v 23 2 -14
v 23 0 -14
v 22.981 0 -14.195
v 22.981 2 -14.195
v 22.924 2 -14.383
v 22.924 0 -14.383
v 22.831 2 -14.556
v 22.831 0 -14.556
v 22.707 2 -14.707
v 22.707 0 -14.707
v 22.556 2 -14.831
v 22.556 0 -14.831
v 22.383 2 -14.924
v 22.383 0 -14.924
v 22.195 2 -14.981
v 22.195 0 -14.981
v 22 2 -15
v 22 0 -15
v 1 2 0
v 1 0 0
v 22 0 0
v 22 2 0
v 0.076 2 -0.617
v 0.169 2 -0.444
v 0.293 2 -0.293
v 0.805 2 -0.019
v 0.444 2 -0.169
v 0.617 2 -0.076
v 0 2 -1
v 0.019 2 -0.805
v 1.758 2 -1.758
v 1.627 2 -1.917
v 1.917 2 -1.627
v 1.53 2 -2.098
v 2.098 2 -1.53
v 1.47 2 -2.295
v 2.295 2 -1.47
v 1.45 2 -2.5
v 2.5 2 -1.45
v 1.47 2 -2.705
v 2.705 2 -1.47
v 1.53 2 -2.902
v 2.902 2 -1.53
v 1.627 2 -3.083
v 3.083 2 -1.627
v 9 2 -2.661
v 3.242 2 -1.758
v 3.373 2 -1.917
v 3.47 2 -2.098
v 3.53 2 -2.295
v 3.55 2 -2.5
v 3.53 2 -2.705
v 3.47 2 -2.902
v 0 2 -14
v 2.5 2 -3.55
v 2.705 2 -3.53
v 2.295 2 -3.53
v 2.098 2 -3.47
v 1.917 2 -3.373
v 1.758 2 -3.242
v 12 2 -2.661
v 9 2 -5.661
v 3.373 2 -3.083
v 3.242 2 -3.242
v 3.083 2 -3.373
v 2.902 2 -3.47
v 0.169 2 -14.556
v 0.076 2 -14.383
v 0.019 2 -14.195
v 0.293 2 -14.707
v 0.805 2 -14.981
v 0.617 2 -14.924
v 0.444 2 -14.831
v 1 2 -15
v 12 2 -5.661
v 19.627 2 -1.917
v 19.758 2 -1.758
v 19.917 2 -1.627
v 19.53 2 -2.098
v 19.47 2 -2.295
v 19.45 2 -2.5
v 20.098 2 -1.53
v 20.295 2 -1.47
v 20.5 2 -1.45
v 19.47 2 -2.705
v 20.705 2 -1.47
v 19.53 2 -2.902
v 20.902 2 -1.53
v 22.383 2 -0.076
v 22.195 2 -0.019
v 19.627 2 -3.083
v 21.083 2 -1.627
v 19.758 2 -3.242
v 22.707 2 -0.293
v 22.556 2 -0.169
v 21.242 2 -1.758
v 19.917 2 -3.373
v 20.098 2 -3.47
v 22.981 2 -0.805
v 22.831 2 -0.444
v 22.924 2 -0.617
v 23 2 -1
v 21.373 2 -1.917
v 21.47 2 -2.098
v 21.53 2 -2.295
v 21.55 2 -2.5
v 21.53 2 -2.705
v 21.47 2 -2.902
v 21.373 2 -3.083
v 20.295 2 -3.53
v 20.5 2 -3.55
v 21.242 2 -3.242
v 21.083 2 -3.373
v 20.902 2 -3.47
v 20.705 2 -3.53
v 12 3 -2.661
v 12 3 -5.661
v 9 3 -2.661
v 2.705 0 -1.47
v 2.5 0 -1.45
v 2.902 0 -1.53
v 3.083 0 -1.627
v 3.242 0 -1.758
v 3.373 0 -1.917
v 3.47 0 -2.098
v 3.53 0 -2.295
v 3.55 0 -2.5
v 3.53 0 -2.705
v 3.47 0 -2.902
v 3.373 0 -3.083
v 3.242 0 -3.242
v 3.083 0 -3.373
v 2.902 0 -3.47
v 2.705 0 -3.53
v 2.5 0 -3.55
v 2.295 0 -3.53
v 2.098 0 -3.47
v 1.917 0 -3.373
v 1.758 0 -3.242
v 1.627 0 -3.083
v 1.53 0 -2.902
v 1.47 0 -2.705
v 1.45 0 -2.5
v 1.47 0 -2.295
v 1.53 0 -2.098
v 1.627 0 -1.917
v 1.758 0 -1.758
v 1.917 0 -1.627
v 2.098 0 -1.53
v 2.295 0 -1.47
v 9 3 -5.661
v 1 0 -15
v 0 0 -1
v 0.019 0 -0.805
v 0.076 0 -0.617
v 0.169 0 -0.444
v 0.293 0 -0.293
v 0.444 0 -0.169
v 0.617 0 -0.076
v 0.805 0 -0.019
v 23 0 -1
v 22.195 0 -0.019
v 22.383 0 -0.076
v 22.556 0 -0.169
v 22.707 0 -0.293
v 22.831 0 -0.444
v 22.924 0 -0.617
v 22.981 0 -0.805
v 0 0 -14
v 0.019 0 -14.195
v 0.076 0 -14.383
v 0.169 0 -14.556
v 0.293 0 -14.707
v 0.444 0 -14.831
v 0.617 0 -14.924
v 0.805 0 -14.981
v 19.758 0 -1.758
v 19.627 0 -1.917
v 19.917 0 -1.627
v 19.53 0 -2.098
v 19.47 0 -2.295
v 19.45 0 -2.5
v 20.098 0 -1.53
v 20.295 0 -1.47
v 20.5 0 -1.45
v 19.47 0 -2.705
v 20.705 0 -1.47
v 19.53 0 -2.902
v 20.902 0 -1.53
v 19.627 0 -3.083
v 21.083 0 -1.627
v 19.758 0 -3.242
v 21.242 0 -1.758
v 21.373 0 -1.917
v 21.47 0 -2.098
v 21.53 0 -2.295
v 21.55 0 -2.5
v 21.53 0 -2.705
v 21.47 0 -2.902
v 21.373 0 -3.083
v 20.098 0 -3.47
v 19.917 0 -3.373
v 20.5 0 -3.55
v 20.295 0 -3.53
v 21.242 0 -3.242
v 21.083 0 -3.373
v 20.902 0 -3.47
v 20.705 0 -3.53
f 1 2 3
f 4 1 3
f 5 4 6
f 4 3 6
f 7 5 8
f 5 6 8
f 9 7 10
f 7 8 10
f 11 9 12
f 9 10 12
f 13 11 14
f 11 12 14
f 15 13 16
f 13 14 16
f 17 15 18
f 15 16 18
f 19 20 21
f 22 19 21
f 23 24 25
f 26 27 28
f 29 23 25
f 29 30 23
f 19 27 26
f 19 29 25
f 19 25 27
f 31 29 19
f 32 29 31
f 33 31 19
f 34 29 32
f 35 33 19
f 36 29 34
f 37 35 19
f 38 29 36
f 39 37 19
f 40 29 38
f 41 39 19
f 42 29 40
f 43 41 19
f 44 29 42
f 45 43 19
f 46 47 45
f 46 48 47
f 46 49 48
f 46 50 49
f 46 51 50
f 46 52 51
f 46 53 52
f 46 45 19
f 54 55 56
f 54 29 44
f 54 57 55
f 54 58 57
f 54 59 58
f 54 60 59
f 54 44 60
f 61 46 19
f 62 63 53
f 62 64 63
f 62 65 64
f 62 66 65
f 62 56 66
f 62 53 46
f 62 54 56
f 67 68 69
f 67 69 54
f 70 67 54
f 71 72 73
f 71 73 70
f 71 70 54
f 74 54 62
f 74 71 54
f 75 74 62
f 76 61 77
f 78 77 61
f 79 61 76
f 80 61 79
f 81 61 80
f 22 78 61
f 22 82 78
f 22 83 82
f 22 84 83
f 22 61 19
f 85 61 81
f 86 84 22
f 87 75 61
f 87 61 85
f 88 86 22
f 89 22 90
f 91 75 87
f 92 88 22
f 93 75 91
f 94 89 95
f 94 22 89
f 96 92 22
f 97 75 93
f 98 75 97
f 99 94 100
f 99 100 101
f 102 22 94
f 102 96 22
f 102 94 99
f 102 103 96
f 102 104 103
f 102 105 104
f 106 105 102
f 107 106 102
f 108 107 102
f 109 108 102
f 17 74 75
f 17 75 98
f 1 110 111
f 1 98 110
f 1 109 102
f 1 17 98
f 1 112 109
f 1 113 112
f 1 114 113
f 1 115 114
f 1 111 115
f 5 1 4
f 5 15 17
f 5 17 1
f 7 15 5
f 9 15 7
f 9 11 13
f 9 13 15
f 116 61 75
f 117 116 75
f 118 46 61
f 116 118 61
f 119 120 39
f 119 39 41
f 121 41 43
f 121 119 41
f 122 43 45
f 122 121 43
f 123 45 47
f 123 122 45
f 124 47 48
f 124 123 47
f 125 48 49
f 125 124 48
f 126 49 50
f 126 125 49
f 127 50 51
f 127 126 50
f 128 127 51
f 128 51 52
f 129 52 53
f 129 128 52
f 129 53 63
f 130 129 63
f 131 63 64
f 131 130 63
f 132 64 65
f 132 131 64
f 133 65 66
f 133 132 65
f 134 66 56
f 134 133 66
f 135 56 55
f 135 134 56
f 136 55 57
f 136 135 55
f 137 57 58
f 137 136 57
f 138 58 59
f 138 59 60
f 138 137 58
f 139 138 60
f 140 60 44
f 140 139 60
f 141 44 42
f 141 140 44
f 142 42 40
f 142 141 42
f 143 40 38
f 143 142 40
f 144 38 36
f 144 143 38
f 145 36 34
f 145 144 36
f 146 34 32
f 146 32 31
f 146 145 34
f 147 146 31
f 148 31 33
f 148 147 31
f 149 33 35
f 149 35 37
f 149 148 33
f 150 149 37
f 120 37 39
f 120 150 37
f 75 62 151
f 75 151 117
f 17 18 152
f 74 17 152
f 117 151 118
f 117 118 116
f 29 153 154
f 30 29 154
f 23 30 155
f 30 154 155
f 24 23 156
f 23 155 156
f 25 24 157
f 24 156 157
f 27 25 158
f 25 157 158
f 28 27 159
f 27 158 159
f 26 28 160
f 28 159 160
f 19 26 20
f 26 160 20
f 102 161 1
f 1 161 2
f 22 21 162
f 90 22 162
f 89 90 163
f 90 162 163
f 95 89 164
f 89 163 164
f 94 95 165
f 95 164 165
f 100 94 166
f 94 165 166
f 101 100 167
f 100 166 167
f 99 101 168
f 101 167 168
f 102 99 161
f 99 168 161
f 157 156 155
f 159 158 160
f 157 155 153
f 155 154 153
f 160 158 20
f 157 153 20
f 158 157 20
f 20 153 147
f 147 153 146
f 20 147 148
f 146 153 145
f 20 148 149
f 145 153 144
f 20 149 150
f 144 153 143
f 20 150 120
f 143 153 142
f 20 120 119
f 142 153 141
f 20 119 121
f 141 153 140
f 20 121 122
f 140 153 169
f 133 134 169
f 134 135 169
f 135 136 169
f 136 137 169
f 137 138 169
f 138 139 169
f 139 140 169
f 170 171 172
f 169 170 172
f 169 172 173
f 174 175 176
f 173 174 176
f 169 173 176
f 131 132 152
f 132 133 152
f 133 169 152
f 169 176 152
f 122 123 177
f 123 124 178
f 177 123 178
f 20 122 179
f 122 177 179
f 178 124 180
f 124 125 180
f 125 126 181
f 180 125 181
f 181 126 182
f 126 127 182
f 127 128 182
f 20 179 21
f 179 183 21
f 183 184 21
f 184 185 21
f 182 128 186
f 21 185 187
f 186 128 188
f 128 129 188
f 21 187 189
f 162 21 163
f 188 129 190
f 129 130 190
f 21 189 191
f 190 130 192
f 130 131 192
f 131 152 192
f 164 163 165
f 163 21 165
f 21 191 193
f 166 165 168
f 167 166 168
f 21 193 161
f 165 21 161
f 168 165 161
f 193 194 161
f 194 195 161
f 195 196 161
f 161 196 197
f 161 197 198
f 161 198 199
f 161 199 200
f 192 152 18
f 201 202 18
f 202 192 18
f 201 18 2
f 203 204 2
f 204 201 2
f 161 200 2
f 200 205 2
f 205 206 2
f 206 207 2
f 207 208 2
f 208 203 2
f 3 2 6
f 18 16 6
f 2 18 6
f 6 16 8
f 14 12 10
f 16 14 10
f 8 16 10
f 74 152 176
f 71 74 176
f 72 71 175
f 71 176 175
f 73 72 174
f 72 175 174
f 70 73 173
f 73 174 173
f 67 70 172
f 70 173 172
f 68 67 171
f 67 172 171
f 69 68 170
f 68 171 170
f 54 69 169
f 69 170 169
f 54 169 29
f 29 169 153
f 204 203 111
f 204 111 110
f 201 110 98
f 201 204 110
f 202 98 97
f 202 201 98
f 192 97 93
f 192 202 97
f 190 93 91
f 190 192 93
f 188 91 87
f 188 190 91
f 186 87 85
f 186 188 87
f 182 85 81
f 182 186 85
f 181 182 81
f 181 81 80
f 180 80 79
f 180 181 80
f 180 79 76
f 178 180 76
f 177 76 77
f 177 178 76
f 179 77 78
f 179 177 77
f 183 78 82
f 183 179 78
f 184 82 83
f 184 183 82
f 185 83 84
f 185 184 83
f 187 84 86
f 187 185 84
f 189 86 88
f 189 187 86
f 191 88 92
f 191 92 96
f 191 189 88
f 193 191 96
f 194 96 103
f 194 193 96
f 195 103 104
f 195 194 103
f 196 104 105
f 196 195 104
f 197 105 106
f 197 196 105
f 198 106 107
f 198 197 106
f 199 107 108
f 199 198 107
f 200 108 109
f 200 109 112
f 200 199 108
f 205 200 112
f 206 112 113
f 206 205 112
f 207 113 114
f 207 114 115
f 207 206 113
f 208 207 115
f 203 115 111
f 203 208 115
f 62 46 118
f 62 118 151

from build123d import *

# Parameters (mm, degrees)
SKETCH_1_R      = 1.05
EXTRUDE_1_DEPTH = 2
SKETCH_2_W      = 3
SKETCH_2_H      = 3
EXTRUDE_2_DEPTH = 1


with BuildPart() as part:
    # 草图1 → 凸台-拉伸1 (new body)
    with BuildSketch(Plane(origin=(0, 0, 0), x_dir=(1, 0, 0), z_dir=(0, 1, 0))):
        with BuildLine():
            Line((1, 0), (22, 0))
            ThreePointArc((22, 0), (22.707106781, 0.292893219), (23, 1))
            Line((23, 1), (23, 14))
            ThreePointArc((23, 14), (22.707106781, 14.707106781), (22, 15))
            Line((22, 15), (1, 15))
            ThreePointArc((1, 15), (0.292893219, 14.707106781), (0, 14))
            Line((0, 14), (0, 1))
            ThreePointArc((0, 1), (0.292893219, 0.292893219), (1, 0))
        make_face()
        with Locations(Location((2.5, 2.5, 0), (0, 0, 270))):
            Circle(SKETCH_1_R, mode=Mode.SUBTRACT)
        with Locations(Location((20.5, 2.5, 0), (0, 0, 90))):
            Circle(SKETCH_1_R, mode=Mode.SUBTRACT)
    extrude(amount=EXTRUDE_1_DEPTH)

    # 草图2 → 凸台-拉伸2 (add)
    with BuildSketch(Plane(origin=(0, 2, 0), x_dir=(1, 0, 0), z_dir=(0, 1, 0))):
        with Locations((10.5, 4.160508355)):
            Rectangle(SKETCH_2_W, SKETCH_2_H)
    extrude(amount=EXTRUDE_2_DEPTH)


solid = part.part
